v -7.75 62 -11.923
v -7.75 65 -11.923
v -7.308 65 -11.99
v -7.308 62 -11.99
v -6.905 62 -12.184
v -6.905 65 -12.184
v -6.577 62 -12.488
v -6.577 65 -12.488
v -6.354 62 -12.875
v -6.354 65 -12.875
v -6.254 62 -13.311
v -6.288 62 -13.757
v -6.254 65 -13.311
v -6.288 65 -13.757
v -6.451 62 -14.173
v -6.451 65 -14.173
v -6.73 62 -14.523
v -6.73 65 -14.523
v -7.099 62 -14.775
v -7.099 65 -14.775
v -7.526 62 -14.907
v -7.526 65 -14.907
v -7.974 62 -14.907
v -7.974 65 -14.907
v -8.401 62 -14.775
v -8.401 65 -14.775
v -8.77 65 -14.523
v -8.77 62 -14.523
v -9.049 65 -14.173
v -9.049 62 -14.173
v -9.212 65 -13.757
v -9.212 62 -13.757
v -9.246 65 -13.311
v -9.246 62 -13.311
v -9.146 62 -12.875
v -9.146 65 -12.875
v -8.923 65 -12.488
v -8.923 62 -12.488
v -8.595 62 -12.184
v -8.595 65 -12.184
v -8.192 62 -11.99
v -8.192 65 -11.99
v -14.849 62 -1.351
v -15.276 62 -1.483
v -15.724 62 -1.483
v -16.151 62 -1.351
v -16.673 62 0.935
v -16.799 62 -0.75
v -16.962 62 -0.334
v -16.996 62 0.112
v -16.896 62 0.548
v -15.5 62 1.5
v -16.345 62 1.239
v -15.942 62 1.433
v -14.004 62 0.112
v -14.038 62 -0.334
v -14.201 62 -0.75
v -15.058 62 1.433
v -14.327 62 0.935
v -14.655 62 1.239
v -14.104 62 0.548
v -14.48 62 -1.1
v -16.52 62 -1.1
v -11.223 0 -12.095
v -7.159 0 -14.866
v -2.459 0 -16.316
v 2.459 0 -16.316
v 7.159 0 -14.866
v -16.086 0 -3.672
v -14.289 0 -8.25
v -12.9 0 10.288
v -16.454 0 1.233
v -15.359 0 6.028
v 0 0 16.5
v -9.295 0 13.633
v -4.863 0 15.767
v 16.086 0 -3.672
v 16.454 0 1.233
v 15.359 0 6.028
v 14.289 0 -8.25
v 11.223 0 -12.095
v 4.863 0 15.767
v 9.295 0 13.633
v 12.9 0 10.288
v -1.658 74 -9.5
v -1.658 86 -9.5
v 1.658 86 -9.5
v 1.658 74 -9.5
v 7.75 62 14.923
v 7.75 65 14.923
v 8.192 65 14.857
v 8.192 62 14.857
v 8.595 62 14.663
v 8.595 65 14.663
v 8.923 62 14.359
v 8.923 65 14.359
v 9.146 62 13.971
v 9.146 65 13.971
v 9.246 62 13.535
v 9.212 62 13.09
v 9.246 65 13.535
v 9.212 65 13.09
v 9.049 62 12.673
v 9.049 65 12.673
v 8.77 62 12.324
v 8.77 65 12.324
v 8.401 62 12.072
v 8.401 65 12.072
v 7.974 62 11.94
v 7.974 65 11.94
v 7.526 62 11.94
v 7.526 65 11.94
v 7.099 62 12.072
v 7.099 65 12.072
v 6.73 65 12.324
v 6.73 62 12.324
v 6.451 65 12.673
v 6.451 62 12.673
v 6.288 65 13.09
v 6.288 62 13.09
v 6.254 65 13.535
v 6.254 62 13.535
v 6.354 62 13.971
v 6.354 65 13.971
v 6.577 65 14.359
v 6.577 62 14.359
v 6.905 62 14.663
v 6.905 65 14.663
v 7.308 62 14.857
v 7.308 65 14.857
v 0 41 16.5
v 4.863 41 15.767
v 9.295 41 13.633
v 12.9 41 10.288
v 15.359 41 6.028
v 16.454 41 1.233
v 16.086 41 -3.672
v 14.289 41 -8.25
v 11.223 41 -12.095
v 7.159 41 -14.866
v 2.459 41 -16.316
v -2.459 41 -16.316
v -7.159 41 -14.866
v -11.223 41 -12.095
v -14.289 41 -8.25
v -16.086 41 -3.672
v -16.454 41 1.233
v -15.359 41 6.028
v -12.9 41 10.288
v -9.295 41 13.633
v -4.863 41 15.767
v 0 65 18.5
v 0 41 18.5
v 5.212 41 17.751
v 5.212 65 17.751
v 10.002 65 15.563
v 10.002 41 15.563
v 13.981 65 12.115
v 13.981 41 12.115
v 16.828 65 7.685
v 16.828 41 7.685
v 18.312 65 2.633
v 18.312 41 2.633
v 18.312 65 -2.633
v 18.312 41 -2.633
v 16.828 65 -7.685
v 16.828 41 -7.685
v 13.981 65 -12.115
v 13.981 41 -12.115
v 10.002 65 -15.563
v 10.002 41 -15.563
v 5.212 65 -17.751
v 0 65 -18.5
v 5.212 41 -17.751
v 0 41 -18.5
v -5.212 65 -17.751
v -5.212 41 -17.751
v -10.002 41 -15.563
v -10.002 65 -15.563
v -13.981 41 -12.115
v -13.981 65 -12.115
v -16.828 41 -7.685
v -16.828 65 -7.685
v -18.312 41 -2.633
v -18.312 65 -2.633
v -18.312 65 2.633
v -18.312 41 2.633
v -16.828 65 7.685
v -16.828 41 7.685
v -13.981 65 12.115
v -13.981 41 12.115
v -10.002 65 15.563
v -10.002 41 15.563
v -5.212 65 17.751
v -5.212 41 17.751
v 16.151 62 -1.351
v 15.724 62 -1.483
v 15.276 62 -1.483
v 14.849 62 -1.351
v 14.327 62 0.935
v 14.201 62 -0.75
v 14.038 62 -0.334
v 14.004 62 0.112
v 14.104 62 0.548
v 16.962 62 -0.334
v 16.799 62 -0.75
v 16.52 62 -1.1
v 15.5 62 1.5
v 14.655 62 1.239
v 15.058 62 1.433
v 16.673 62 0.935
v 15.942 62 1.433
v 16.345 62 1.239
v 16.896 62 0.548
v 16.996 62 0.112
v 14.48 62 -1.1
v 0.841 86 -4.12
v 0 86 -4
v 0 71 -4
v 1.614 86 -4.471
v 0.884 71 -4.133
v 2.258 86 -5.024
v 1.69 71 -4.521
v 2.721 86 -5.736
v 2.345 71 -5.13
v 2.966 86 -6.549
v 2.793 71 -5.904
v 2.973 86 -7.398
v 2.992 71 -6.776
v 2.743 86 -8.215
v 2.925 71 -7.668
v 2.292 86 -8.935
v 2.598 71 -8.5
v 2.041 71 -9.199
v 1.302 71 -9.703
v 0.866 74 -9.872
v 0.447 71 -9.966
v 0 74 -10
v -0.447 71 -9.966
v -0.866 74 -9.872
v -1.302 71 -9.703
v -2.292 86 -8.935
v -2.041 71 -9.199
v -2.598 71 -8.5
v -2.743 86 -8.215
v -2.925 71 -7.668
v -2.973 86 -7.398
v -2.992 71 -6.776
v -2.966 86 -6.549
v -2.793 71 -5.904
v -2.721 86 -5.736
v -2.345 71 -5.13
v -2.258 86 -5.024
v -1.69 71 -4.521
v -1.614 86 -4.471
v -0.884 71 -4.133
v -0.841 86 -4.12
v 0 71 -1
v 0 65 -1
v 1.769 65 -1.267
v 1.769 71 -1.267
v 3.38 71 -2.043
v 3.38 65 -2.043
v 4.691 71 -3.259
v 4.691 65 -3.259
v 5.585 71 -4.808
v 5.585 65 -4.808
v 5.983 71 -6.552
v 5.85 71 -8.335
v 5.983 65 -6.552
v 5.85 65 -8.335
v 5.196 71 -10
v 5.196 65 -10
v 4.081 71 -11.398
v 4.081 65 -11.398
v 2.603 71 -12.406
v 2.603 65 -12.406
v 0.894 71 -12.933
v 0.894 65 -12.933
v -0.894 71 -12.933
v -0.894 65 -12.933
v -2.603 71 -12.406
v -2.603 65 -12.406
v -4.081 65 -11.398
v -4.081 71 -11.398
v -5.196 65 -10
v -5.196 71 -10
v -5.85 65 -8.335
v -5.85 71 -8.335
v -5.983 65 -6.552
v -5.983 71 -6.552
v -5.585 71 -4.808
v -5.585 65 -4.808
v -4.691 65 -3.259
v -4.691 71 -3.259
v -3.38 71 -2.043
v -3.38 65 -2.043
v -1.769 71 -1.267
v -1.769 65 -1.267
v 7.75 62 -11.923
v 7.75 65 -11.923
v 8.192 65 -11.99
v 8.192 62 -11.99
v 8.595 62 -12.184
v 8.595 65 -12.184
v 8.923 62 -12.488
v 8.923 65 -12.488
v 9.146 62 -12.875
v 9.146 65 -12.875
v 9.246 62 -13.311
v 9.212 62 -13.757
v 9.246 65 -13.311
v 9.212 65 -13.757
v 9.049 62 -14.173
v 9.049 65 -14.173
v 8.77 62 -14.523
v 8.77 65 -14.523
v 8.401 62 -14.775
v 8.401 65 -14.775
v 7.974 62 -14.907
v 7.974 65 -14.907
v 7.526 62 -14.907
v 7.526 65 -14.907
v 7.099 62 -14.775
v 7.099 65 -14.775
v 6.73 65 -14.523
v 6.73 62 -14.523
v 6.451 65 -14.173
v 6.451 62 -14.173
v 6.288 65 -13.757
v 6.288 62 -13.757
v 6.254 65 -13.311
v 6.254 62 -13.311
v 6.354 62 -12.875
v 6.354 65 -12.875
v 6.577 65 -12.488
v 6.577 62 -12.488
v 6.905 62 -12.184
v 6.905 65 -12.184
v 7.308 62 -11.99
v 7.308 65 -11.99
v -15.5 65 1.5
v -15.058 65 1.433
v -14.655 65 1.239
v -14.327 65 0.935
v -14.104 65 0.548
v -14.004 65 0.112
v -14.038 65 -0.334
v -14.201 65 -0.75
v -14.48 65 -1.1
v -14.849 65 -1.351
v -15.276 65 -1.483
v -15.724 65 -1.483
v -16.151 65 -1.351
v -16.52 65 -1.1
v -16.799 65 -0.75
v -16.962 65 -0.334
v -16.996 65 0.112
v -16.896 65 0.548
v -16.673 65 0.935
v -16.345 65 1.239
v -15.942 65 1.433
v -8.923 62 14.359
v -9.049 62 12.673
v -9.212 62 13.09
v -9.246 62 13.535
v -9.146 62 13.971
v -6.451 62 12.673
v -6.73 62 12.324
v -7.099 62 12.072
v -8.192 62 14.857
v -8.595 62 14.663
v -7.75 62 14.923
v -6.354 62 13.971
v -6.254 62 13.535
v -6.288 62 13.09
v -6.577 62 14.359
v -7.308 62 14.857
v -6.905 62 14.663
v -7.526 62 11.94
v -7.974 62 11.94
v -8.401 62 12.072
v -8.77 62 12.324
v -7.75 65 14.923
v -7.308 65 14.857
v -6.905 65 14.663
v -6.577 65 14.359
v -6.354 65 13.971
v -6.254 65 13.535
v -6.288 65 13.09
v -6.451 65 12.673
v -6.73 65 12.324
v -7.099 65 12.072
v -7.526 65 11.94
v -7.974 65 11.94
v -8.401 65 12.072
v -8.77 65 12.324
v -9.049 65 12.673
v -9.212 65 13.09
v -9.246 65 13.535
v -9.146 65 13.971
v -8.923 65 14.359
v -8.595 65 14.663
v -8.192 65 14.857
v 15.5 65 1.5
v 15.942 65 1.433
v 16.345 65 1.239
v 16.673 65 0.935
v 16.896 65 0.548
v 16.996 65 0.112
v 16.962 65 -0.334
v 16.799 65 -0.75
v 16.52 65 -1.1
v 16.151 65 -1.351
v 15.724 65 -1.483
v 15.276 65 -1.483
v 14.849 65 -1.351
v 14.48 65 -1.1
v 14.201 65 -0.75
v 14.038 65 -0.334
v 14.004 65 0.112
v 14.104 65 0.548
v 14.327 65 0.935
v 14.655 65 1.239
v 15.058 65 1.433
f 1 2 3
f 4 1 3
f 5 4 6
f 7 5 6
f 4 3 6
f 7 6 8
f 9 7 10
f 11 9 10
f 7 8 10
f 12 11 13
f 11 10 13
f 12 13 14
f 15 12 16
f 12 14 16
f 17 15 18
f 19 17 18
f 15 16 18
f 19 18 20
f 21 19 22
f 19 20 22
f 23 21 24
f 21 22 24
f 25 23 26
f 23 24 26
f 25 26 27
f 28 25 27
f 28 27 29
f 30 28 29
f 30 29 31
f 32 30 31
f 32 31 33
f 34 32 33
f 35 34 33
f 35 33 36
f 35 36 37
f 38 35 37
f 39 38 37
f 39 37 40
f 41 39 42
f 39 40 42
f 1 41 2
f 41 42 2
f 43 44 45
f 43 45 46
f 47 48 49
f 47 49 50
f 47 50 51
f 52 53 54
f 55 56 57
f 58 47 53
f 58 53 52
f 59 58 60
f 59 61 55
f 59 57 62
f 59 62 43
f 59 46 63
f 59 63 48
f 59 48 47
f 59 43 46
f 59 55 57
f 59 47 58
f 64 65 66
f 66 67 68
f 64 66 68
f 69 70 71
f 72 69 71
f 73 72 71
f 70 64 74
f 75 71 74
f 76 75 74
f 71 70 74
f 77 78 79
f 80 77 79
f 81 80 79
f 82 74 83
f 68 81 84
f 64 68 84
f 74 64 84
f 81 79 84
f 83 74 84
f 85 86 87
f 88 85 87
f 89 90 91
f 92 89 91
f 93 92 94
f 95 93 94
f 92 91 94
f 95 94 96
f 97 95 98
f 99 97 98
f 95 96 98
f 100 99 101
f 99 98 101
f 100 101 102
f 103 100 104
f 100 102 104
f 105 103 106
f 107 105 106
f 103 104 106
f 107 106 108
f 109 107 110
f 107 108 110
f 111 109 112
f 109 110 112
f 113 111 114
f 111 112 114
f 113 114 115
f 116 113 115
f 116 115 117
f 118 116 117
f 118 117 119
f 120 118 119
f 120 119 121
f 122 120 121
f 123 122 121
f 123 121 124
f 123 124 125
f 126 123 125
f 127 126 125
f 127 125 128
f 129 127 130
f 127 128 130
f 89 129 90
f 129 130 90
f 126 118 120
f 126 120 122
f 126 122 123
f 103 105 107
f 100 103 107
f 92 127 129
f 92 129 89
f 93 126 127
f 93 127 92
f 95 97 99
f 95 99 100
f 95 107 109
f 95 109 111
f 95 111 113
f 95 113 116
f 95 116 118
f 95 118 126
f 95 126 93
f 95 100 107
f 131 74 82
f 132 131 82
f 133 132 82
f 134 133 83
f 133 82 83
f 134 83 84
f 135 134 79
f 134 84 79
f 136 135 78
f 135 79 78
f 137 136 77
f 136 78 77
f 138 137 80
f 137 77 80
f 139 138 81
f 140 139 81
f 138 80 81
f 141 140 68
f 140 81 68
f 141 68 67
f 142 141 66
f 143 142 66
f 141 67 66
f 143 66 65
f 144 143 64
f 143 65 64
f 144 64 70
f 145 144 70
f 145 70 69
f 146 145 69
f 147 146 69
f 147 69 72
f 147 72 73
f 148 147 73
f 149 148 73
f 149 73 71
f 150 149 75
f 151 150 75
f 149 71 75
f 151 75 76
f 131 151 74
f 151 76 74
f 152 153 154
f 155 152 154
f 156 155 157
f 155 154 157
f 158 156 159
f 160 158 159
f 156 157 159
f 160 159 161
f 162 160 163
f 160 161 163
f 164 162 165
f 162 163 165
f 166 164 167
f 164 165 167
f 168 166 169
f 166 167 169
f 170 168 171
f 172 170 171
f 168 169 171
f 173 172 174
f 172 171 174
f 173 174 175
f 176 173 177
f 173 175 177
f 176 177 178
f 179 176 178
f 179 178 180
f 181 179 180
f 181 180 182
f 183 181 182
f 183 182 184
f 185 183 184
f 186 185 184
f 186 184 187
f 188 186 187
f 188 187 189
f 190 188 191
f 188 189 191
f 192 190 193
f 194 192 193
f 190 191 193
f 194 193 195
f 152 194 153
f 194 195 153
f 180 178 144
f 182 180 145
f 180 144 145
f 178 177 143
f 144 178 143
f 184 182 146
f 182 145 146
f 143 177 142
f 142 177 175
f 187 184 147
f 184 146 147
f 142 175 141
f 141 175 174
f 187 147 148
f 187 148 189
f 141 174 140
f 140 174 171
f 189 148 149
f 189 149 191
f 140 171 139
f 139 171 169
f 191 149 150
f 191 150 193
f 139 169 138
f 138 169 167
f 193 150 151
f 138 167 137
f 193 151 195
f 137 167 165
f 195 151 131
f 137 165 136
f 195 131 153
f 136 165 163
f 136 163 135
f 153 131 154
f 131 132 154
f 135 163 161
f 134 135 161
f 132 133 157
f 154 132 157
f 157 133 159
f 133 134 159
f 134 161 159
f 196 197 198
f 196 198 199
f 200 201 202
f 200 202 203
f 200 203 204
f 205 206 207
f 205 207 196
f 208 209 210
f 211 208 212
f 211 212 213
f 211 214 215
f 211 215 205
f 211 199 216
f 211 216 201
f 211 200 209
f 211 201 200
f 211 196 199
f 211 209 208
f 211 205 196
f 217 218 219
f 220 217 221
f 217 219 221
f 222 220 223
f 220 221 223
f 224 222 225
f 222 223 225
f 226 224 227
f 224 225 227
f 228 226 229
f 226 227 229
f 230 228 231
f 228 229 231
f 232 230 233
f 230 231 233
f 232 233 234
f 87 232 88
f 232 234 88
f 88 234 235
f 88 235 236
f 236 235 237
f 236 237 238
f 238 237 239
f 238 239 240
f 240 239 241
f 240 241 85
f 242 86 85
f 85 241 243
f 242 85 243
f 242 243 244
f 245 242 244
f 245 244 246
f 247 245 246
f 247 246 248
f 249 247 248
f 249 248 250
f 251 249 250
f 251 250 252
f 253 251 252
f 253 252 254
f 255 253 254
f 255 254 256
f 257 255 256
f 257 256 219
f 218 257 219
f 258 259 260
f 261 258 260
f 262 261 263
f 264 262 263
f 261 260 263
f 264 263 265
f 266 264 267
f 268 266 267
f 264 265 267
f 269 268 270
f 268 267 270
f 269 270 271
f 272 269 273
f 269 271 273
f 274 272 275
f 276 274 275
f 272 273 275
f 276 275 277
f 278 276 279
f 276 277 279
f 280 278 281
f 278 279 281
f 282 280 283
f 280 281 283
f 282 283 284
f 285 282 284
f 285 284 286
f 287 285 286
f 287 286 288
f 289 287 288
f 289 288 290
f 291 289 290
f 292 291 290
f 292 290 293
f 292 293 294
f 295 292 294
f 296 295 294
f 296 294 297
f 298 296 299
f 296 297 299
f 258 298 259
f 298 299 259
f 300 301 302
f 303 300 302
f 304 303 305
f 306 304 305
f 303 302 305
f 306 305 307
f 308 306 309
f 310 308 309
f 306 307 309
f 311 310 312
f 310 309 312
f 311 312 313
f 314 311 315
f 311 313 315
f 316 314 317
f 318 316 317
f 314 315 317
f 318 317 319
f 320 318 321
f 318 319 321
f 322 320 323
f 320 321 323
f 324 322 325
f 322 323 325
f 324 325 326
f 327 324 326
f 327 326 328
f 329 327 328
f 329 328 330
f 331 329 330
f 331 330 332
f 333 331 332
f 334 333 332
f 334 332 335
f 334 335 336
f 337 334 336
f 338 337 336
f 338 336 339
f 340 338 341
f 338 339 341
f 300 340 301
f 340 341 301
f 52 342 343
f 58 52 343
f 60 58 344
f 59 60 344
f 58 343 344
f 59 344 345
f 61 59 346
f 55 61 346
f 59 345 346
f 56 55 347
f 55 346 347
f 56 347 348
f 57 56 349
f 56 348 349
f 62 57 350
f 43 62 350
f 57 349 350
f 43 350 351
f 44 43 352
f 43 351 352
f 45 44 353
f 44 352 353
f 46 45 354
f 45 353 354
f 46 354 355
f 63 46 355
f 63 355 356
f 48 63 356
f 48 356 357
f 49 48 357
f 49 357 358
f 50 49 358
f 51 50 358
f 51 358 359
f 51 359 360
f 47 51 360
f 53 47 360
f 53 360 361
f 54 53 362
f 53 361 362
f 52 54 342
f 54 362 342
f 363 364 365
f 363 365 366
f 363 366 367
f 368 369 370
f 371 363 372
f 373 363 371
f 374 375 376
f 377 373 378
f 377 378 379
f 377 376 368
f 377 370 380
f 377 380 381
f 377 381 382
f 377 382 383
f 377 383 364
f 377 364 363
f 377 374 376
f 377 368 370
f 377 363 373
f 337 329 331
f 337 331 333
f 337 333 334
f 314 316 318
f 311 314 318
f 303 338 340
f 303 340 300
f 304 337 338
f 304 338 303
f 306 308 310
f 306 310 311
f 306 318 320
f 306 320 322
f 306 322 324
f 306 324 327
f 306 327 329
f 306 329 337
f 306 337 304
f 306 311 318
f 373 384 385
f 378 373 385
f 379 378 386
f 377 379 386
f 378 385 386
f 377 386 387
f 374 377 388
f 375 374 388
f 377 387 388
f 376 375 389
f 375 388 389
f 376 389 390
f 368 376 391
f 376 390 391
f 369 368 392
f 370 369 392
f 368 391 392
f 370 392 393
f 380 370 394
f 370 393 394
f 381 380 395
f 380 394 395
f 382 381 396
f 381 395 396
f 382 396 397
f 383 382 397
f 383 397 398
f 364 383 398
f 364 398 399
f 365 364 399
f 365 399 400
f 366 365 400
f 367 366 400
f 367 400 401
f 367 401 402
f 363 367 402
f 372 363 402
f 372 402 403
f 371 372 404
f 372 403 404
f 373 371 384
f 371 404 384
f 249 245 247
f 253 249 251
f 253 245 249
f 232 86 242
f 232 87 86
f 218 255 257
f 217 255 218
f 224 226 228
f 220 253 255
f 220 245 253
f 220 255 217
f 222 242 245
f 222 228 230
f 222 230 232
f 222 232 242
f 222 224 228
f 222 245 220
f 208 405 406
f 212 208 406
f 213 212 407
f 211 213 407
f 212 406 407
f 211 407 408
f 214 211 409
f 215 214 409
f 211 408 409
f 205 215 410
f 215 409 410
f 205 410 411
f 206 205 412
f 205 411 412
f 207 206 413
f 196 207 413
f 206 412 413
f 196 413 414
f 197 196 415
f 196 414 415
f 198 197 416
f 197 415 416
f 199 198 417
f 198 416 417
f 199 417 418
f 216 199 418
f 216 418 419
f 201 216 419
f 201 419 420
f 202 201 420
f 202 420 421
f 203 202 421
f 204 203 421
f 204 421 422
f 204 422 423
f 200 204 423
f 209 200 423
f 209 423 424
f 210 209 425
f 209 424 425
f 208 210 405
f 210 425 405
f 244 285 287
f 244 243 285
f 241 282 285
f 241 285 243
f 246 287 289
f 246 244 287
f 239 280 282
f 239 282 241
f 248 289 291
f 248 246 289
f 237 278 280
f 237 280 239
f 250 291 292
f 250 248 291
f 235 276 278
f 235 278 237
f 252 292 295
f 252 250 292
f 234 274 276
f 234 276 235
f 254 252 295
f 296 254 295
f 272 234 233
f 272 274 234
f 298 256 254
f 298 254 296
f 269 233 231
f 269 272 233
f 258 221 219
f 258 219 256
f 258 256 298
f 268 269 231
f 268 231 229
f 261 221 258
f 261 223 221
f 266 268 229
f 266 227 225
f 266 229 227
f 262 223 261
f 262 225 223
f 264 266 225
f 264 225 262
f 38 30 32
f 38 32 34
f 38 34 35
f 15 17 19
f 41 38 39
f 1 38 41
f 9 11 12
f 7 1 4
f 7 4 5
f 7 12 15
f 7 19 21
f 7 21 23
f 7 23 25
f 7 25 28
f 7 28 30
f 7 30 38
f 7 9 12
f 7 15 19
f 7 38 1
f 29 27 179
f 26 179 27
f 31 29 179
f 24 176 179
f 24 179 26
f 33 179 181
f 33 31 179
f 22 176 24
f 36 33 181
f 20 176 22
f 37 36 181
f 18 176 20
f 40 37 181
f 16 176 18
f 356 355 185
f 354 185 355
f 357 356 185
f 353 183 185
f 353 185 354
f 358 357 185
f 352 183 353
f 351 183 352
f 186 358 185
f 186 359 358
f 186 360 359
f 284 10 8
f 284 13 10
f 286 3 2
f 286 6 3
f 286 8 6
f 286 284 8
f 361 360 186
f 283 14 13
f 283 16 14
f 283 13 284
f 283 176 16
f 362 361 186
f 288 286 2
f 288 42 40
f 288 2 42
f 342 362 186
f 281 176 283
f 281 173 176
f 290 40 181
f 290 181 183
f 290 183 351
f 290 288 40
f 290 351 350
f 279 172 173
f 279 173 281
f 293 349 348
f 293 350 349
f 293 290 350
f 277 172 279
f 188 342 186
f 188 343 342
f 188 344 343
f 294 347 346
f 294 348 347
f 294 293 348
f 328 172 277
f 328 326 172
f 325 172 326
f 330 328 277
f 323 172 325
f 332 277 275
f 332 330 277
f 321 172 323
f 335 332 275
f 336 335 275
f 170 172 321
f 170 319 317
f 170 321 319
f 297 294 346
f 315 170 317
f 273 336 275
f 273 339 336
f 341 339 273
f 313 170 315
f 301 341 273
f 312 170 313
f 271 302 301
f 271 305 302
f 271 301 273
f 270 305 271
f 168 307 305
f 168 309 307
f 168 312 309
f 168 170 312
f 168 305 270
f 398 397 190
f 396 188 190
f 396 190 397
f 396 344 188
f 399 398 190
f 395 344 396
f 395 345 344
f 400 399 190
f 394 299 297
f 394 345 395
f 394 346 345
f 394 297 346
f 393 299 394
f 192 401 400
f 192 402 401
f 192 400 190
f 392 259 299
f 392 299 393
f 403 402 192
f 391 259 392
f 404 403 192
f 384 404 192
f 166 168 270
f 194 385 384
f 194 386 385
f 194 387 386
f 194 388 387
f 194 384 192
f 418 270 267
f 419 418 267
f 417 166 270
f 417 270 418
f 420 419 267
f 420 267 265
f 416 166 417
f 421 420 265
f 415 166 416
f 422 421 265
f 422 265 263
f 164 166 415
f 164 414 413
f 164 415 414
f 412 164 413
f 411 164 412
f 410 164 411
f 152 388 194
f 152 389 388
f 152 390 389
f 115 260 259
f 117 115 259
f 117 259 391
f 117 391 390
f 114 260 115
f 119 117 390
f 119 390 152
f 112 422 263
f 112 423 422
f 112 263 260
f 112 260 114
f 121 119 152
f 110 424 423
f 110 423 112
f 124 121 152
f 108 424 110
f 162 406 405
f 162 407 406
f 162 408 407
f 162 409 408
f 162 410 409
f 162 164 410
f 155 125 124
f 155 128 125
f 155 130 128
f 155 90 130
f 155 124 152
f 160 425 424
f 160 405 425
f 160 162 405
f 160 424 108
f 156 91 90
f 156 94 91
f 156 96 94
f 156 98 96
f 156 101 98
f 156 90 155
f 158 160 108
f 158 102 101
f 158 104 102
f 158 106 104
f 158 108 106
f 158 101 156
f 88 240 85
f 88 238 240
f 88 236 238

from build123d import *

# Parameters (mm, degrees)
SKETCH1_R           = 16.5
BOSS_EXTRUDE1_DEPTH = 41
SKETCH2_R           = 18.5
BOSS_EXTRUDE2_DEPTH = 24
SKETCH3_R           = 6
BOSS_EXTRUDE3_DEPTH = 6
SKETCH4_R           = 3
BOSS_EXTRUDE4_DEPTH = 15
SKETCH5_W           = 8.086329314
SKETCH5_H           = 5.281822038
CUT_EXTRUDE1_DEPTH  = 12
SKETCH6_R           = 1.5
CUT_EXTRUDE2_DEPTH  = 3


with BuildPart() as part:
    # Sketch1 → Boss-Extrude1 (new body)
    with BuildSketch(Plane(origin=(0, 0, 0), x_dir=(1, 0, 0), z_dir=(0, 1, 0))):
        with Locations(Location((0, 0, 0), (0, 0, 270))):
            Circle(SKETCH1_R)
    extrude(amount=BOSS_EXTRUDE1_DEPTH)

    # Sketch2 → Boss-Extrude2 (add)
    with BuildSketch(Plane(origin=(0, 41, 0), x_dir=(1, 0, 0), z_dir=(0, 1, 0))):
        with Locations(Location((0, 0, 0), (0, 0, 270))):
            Circle(SKETCH2_R)
    extrude(amount=BOSS_EXTRUDE2_DEPTH)

    # Sketch3 → Boss-Extrude3 (add)
    with BuildSketch(Plane(origin=(0, 65, 0), x_dir=(1, 0, 0), z_dir=(0, 1, 0))):
        with Locations(Location((0, 7, 0), (0, 0, 270))):
            Circle(SKETCH3_R)
    extrude(amount=BOSS_EXTRUDE3_DEPTH)

    # Sketch4 → Boss-Extrude4 (add)
    with BuildSketch(Plane(origin=(0, 71, 0), x_dir=(1, 0, 0), z_dir=(0, 1, 0))):
        with Locations(Location((0, 7, 0), (0, 0, 270))):
            Circle(SKETCH4_R)
    extrude(amount=BOSS_EXTRUDE4_DEPTH)

    # Sketch5 → Cut-Extrude1 (cut)
    with BuildSketch(Plane(origin=(0, 86, 0), x_dir=(1, 0, 0), z_dir=(0, 1, 0))):
        with Locations((0.101264993, 12.140911019)):
            Rectangle(SKETCH5_W, SKETCH5_H)
    extrude(amount=-CUT_EXTRUDE1_DEPTH, mode=Mode.SUBTRACT)

    # Sketch6 → Cut-Extrude2 (cut)
    with BuildSketch(Plane(origin=(0, 65, 0), x_dir=(1, 0, 0), z_dir=(0, 1, 0))):
        with Locations(Location((-15.5, 0, 0), (0, 0, 270))):
            Circle(SKETCH6_R)
        with Locations(Location((-7.75, 13.423393759, 0), (0, 0, 270))):
            Circle(SKETCH6_R)
        with Locations(Location((7.75, 13.423393759, 0), (0, 0, 270))):
            Circle(SKETCH6_R)
        with Locations(Location((15.5, 0, 0), (0, 0, 270))):
            Circle(SKETCH6_R)
        with Locations(Location((7.75, -13.423393759, 0), (0, 0, 270))):
            Circle(SKETCH6_R)
        with Locations(Location((-7.75, -13.423393759, 0), (0, 0, 270))):
            Circle(SKETCH6_R)
    extrude(amount=-CUT_EXTRUDE2_DEPTH, mode=Mode.SUBTRACT)


solid = part.part
